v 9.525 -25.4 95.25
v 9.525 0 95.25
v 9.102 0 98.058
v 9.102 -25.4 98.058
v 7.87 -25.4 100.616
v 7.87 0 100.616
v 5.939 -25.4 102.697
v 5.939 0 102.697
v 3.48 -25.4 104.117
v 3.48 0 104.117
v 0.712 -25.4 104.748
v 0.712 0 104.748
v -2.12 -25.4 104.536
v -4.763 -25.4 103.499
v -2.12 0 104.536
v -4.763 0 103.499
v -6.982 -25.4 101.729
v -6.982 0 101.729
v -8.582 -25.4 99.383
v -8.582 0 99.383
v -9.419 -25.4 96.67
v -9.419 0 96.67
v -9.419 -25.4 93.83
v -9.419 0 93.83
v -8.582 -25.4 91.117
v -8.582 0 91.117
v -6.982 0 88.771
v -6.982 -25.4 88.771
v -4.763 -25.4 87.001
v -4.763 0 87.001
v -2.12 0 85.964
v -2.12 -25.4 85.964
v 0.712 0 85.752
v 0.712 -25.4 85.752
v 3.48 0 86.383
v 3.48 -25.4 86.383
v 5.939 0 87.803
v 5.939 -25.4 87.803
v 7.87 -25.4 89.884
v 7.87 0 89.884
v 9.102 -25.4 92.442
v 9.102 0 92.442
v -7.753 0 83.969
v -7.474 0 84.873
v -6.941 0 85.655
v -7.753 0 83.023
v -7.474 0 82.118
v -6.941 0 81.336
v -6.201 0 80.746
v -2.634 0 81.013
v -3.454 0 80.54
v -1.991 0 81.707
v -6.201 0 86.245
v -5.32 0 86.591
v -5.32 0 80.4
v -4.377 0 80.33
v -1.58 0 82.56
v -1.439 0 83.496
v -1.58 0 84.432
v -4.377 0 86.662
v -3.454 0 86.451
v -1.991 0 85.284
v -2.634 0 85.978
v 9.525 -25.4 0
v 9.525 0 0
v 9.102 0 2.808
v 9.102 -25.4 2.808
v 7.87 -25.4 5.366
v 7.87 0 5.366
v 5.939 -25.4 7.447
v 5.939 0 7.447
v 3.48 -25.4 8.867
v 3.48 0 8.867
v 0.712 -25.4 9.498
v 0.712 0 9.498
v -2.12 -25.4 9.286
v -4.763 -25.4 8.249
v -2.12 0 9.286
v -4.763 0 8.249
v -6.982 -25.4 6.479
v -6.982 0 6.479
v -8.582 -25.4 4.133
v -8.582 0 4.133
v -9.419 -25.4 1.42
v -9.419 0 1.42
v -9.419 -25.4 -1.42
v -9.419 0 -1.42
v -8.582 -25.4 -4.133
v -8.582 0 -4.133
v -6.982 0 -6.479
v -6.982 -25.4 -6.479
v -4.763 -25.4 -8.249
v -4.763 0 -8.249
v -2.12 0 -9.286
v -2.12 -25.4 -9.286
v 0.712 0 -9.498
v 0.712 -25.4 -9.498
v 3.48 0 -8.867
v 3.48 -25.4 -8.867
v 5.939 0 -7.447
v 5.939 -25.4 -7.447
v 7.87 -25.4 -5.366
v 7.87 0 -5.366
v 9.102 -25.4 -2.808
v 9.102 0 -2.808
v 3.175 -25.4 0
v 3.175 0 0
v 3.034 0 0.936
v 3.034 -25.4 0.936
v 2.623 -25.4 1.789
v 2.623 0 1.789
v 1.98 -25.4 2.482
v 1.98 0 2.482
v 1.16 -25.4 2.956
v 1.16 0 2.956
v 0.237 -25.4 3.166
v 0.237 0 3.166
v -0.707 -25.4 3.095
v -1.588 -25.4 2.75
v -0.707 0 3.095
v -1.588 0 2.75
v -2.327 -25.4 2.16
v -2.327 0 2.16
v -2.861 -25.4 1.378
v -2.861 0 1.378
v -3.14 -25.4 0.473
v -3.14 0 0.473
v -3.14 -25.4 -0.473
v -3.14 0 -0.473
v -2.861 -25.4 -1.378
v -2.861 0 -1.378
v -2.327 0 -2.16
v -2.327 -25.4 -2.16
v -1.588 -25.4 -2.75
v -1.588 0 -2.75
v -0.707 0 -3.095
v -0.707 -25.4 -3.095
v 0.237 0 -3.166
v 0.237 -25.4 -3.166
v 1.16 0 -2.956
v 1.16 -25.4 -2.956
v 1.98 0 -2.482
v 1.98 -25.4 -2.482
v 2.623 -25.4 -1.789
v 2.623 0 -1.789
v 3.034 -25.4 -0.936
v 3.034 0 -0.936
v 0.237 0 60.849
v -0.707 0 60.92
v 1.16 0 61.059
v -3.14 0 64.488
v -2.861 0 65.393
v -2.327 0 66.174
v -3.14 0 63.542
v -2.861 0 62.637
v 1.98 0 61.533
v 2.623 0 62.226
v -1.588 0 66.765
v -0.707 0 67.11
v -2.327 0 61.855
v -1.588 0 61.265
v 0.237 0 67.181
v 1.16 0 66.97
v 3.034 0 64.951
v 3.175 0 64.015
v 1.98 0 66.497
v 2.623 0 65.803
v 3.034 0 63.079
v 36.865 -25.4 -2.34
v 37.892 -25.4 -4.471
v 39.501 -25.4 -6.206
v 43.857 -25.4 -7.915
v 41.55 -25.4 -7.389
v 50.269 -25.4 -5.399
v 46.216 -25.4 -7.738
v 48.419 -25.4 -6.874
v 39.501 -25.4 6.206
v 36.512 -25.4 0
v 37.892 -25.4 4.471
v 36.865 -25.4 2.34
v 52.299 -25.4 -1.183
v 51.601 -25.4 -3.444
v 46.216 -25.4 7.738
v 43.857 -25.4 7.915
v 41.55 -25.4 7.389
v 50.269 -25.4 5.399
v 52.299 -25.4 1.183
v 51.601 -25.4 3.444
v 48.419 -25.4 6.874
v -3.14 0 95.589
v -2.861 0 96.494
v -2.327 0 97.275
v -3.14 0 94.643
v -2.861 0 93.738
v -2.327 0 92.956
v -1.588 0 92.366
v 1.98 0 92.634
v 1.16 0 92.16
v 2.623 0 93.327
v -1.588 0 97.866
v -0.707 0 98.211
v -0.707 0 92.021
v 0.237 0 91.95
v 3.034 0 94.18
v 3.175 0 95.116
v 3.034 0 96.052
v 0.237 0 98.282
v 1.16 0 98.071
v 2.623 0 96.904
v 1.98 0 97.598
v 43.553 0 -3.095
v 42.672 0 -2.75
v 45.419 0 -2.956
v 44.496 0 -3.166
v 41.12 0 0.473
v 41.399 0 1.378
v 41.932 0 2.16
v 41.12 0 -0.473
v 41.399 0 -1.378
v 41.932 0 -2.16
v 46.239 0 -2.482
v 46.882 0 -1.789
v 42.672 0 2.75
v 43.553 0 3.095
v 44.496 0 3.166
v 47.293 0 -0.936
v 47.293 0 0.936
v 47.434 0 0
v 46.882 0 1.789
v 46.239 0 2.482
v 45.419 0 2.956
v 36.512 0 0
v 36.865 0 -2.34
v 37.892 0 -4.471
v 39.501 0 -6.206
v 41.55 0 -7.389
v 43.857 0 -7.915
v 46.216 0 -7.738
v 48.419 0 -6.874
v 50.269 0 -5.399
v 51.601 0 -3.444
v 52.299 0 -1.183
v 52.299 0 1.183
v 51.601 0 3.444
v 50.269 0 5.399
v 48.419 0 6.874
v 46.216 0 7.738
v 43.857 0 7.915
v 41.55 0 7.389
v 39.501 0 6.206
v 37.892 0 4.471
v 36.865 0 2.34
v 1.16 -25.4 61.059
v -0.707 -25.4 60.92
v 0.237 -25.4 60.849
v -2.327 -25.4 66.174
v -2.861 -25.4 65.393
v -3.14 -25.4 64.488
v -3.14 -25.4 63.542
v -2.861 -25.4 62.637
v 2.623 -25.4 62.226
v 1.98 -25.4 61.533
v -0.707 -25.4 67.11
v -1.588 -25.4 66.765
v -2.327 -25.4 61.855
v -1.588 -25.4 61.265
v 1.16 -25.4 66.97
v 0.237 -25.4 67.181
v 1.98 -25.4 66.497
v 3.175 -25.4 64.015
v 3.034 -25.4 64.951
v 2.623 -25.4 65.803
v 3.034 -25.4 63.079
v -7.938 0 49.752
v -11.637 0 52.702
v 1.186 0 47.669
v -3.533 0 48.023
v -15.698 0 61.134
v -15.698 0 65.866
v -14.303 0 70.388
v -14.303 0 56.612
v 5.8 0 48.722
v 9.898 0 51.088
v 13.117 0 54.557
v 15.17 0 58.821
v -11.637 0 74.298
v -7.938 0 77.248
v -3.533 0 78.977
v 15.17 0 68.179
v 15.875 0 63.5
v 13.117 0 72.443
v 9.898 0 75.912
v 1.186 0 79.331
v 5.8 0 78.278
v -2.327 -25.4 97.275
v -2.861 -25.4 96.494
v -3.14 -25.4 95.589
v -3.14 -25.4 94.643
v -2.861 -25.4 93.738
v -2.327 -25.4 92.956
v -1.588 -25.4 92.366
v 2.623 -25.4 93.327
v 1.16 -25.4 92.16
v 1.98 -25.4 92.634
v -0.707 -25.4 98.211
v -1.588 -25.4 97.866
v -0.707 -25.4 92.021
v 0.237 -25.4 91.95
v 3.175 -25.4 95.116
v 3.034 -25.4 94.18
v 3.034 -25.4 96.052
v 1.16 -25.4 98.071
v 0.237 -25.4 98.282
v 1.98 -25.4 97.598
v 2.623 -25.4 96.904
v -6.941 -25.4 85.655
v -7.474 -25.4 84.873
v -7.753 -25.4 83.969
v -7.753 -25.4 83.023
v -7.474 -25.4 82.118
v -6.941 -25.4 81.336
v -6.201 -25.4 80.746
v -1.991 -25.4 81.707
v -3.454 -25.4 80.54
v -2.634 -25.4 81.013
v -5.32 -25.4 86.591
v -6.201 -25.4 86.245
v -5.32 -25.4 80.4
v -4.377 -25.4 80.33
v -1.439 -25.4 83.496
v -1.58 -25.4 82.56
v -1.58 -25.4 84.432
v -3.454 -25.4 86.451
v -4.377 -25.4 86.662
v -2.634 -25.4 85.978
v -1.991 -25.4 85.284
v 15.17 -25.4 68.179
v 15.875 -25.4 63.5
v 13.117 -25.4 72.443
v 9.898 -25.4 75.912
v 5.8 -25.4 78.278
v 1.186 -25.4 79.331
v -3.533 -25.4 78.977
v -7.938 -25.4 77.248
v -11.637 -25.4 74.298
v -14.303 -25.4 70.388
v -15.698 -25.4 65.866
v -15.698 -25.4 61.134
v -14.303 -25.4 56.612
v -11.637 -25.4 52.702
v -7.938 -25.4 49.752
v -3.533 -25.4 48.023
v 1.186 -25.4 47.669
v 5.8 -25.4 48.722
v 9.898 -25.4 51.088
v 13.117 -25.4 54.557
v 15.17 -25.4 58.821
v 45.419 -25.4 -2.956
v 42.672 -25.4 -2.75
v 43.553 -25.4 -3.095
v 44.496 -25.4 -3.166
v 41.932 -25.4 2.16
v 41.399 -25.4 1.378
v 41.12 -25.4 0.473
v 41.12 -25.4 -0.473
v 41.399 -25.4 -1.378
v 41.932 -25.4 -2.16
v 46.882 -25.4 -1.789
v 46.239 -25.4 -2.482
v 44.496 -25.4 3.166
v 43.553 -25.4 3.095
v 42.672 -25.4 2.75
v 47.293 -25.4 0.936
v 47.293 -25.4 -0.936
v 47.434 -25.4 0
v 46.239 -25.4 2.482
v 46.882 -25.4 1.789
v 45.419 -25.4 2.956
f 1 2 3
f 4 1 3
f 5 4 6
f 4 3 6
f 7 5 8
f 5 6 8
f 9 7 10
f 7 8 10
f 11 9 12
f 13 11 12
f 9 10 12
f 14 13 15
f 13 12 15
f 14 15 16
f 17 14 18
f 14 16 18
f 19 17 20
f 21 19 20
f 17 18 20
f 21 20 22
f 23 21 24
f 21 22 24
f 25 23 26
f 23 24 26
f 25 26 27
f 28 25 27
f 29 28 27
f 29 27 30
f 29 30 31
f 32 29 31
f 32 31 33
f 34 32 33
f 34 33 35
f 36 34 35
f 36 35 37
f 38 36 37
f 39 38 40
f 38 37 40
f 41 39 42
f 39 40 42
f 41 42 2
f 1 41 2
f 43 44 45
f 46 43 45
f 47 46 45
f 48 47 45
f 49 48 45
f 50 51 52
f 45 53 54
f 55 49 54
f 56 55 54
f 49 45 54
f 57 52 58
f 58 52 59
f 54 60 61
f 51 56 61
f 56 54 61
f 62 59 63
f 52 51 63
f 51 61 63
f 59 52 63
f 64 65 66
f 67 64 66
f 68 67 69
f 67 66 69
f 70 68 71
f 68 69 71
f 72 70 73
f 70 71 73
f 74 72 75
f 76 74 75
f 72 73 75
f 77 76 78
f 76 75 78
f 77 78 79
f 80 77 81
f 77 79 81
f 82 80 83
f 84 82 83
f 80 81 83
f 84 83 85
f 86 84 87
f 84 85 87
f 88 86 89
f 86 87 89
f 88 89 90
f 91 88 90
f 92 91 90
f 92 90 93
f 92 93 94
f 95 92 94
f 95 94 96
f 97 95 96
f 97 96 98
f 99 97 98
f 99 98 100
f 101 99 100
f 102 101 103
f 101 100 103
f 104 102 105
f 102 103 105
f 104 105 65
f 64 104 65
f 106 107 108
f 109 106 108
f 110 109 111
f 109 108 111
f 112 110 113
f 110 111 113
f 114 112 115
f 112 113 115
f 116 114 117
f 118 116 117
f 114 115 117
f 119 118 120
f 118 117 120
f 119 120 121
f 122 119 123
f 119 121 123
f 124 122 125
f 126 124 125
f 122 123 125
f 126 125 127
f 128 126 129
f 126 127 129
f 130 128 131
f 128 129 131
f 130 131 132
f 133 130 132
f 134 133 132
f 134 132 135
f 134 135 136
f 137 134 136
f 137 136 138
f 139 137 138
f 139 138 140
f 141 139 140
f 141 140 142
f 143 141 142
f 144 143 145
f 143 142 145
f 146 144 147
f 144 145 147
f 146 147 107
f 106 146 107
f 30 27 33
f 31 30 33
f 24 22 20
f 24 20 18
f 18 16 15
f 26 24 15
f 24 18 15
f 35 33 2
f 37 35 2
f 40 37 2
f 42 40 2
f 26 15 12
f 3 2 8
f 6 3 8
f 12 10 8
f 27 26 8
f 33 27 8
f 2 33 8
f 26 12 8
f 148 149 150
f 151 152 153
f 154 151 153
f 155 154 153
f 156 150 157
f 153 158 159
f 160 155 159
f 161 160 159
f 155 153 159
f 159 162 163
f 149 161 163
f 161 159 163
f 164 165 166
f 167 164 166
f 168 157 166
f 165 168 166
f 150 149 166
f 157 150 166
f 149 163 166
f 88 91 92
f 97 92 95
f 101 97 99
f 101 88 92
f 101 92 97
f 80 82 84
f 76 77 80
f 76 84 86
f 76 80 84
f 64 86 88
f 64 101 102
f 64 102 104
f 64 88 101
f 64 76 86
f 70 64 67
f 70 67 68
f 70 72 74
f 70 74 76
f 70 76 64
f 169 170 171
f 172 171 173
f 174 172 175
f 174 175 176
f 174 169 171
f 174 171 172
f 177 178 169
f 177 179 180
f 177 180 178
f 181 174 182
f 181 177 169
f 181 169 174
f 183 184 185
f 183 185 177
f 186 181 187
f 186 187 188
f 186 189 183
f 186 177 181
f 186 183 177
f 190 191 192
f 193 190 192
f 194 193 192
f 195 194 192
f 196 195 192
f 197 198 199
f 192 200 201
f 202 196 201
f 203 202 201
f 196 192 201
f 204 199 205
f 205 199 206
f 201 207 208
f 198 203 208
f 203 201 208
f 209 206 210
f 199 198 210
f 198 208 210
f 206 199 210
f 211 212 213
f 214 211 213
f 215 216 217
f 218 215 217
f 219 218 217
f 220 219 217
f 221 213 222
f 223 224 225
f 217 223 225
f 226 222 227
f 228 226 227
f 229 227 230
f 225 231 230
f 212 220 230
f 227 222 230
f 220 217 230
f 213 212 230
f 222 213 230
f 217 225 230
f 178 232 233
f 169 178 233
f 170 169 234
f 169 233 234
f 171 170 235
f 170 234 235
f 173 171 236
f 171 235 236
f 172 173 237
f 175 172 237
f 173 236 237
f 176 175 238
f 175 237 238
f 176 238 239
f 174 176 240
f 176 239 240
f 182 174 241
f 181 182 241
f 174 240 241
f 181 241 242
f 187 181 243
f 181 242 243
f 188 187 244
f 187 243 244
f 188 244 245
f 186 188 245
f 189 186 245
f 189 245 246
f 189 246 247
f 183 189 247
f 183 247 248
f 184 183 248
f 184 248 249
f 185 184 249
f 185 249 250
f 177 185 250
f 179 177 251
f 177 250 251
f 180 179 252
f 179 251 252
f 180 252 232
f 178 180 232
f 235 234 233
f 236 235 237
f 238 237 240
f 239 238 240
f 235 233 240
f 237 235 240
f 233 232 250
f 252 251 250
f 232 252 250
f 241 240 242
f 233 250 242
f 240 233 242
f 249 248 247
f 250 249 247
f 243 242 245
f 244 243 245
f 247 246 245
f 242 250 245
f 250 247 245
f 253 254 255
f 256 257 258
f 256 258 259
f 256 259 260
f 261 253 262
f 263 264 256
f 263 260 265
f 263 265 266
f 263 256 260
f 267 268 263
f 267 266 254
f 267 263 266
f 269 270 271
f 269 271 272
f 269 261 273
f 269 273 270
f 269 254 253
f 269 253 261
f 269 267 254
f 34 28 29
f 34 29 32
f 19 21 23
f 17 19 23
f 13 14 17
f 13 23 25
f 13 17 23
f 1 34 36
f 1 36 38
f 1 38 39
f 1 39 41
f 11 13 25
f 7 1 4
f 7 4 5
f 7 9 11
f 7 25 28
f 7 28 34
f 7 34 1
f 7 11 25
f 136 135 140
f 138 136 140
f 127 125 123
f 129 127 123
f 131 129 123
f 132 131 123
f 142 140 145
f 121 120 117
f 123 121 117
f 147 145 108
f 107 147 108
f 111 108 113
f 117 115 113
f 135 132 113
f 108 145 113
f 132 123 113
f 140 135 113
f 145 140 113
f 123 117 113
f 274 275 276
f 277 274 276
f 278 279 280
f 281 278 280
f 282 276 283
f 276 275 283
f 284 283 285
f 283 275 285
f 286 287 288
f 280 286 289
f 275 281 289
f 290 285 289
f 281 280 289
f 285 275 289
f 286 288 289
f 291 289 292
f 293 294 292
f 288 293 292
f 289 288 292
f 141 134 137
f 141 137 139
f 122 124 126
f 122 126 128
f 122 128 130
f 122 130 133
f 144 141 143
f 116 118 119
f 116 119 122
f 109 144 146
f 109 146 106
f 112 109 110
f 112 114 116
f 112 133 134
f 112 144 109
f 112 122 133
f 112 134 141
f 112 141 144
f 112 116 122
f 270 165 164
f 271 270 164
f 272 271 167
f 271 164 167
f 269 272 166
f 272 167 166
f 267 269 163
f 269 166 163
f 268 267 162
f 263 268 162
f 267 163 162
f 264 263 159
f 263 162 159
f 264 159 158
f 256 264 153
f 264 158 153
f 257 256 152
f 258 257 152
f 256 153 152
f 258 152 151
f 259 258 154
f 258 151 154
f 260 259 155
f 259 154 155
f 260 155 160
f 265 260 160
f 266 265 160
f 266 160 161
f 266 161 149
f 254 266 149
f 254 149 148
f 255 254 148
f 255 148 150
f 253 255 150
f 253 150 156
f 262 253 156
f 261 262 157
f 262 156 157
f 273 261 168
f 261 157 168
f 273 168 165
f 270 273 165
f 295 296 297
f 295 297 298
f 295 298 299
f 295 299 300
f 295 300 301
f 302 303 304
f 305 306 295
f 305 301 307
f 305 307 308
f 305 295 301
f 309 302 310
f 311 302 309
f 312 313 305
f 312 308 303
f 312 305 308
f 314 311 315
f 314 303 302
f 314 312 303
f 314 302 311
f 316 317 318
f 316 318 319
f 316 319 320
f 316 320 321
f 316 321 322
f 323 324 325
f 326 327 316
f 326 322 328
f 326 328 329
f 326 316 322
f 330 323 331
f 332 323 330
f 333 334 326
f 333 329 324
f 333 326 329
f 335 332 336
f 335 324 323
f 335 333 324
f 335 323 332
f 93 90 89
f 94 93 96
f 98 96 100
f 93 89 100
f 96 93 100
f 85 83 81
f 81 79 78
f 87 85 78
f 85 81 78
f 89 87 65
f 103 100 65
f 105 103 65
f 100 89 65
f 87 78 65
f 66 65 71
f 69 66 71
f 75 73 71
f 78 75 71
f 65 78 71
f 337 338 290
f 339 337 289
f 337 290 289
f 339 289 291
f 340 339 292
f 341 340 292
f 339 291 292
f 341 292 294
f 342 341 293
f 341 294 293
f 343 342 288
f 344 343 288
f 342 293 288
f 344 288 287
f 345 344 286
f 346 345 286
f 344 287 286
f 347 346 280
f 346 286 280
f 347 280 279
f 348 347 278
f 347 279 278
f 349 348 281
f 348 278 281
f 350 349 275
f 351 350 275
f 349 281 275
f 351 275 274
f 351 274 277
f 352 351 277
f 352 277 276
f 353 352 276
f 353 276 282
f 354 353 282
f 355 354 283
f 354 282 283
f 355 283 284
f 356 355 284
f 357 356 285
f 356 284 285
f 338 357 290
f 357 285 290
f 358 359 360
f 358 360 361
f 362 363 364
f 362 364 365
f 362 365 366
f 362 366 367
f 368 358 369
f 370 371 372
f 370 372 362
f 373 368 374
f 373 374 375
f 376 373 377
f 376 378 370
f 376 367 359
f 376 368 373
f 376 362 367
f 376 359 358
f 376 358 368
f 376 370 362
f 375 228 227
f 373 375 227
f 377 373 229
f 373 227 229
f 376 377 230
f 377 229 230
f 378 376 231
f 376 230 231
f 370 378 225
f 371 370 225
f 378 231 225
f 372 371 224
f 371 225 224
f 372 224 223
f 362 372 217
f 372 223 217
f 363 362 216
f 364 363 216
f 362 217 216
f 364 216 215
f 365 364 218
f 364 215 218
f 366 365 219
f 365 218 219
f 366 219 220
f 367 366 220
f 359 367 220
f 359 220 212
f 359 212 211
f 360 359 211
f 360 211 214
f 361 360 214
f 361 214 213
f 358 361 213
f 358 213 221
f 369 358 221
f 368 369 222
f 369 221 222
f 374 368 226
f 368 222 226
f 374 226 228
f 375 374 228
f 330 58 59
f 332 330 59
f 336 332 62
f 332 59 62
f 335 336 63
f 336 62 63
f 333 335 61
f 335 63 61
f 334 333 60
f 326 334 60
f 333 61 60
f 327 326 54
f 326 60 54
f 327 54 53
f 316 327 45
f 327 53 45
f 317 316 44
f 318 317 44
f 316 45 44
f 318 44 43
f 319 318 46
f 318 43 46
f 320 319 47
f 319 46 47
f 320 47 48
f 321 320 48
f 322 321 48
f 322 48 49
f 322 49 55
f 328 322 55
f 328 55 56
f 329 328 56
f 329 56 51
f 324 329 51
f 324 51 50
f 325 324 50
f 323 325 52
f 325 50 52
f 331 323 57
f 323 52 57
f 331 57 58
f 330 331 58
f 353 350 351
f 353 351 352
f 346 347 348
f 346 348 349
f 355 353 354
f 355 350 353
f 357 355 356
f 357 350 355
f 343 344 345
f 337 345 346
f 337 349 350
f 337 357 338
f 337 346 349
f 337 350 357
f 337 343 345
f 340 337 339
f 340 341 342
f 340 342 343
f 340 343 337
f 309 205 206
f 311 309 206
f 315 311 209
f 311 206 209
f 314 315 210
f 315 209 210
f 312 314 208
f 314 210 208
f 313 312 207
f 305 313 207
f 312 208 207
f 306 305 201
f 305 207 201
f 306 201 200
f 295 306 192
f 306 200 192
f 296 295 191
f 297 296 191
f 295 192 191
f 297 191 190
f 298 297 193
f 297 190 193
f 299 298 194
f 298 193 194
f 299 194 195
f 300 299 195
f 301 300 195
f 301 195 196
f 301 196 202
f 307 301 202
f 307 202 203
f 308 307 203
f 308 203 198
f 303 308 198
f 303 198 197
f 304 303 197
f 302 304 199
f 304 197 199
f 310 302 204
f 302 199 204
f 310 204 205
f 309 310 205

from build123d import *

# Parameters (mm, degrees)
F2_DEPTH = 25.4
F0_R     = 9.525
F0_R_2   = 15.875
F1_R     = 3.175


with BuildPart() as f2:
    # F0 (on Front) → F2 (new body)
    with BuildSketch(Plane.XZ):
        with BuildLine():
            ThreePointArc((52.3875, 0), (44.45, 7.9375), (36.5125, 0))
            ThreePointArc((36.5125, 0), (44.45, -7.9375), (52.3875, 0))
        make_face()
    extrude(amount=F2_DEPTH)


with BuildPart() as f2b:
    # F0 (on Front) → F2, piece 2 (new body)
    with BuildSketch(Plane.XZ):
        Circle(F0_R)
    extrude(amount=F2_DEPTH)


with BuildPart() as f2c:
    # F0 (on Front) → F2, piece 3 (new body)
    with BuildSketch(Plane.XZ):
        with Locations((0, 95.25)):
            Circle(F0_R)
    extrude(amount=F2_DEPTH)


with BuildPart() as f2d:
    # F0 (on Front) → F2, piece 4 (new body)
    with BuildSketch(Plane.XZ):
        with Locations((0, 63.5)):
            Circle(F0_R_2)
    extrude(amount=F2_DEPTH)


with BuildPart() as f2e:
    # F1 (on Front) → F2, piece 5 (new body)
    with BuildSketch(Plane.XZ):
        with Locations((0, 95.1159447432)):
            Circle(F1_R)
    extrude(amount=F2_DEPTH)


with BuildPart() as f2f:
    # F1 (on Front) → F2, piece 6 (new body)
    with BuildSketch(Plane.XZ):
        with Locations((0, 64.0149340034)):
            Circle(F1_R)
    extrude(amount=F2_DEPTH)


with BuildPart() as f2g:
    # F1 (on Front) → F2, piece 7 (new body)
    with BuildSketch(Plane.XZ):
        Circle(F1_R)
    extrude(amount=F2_DEPTH)


with BuildPart() as f2h:
    # F1 (on Front) → F2, piece 8 (new body)
    with BuildSketch(Plane.XZ):
        with Locations((44.2591272295, 0)):
            Circle(F1_R)
    extrude(amount=F2_DEPTH)


with BuildPart() as f2i:
    # F1 (on Front) → F2, piece 9 (new body)
    with BuildSketch(Plane.XZ):
        with Locations((-4.6138879843, 83.4957882762)):
            Circle(F1_R)
    extrude(amount=F2_DEPTH)


solid = Compound([f2.part, f2b.part, f2c.part, f2d.part, f2e.part, f2f.part, f2g.part, f2h.part, f2i.part])
